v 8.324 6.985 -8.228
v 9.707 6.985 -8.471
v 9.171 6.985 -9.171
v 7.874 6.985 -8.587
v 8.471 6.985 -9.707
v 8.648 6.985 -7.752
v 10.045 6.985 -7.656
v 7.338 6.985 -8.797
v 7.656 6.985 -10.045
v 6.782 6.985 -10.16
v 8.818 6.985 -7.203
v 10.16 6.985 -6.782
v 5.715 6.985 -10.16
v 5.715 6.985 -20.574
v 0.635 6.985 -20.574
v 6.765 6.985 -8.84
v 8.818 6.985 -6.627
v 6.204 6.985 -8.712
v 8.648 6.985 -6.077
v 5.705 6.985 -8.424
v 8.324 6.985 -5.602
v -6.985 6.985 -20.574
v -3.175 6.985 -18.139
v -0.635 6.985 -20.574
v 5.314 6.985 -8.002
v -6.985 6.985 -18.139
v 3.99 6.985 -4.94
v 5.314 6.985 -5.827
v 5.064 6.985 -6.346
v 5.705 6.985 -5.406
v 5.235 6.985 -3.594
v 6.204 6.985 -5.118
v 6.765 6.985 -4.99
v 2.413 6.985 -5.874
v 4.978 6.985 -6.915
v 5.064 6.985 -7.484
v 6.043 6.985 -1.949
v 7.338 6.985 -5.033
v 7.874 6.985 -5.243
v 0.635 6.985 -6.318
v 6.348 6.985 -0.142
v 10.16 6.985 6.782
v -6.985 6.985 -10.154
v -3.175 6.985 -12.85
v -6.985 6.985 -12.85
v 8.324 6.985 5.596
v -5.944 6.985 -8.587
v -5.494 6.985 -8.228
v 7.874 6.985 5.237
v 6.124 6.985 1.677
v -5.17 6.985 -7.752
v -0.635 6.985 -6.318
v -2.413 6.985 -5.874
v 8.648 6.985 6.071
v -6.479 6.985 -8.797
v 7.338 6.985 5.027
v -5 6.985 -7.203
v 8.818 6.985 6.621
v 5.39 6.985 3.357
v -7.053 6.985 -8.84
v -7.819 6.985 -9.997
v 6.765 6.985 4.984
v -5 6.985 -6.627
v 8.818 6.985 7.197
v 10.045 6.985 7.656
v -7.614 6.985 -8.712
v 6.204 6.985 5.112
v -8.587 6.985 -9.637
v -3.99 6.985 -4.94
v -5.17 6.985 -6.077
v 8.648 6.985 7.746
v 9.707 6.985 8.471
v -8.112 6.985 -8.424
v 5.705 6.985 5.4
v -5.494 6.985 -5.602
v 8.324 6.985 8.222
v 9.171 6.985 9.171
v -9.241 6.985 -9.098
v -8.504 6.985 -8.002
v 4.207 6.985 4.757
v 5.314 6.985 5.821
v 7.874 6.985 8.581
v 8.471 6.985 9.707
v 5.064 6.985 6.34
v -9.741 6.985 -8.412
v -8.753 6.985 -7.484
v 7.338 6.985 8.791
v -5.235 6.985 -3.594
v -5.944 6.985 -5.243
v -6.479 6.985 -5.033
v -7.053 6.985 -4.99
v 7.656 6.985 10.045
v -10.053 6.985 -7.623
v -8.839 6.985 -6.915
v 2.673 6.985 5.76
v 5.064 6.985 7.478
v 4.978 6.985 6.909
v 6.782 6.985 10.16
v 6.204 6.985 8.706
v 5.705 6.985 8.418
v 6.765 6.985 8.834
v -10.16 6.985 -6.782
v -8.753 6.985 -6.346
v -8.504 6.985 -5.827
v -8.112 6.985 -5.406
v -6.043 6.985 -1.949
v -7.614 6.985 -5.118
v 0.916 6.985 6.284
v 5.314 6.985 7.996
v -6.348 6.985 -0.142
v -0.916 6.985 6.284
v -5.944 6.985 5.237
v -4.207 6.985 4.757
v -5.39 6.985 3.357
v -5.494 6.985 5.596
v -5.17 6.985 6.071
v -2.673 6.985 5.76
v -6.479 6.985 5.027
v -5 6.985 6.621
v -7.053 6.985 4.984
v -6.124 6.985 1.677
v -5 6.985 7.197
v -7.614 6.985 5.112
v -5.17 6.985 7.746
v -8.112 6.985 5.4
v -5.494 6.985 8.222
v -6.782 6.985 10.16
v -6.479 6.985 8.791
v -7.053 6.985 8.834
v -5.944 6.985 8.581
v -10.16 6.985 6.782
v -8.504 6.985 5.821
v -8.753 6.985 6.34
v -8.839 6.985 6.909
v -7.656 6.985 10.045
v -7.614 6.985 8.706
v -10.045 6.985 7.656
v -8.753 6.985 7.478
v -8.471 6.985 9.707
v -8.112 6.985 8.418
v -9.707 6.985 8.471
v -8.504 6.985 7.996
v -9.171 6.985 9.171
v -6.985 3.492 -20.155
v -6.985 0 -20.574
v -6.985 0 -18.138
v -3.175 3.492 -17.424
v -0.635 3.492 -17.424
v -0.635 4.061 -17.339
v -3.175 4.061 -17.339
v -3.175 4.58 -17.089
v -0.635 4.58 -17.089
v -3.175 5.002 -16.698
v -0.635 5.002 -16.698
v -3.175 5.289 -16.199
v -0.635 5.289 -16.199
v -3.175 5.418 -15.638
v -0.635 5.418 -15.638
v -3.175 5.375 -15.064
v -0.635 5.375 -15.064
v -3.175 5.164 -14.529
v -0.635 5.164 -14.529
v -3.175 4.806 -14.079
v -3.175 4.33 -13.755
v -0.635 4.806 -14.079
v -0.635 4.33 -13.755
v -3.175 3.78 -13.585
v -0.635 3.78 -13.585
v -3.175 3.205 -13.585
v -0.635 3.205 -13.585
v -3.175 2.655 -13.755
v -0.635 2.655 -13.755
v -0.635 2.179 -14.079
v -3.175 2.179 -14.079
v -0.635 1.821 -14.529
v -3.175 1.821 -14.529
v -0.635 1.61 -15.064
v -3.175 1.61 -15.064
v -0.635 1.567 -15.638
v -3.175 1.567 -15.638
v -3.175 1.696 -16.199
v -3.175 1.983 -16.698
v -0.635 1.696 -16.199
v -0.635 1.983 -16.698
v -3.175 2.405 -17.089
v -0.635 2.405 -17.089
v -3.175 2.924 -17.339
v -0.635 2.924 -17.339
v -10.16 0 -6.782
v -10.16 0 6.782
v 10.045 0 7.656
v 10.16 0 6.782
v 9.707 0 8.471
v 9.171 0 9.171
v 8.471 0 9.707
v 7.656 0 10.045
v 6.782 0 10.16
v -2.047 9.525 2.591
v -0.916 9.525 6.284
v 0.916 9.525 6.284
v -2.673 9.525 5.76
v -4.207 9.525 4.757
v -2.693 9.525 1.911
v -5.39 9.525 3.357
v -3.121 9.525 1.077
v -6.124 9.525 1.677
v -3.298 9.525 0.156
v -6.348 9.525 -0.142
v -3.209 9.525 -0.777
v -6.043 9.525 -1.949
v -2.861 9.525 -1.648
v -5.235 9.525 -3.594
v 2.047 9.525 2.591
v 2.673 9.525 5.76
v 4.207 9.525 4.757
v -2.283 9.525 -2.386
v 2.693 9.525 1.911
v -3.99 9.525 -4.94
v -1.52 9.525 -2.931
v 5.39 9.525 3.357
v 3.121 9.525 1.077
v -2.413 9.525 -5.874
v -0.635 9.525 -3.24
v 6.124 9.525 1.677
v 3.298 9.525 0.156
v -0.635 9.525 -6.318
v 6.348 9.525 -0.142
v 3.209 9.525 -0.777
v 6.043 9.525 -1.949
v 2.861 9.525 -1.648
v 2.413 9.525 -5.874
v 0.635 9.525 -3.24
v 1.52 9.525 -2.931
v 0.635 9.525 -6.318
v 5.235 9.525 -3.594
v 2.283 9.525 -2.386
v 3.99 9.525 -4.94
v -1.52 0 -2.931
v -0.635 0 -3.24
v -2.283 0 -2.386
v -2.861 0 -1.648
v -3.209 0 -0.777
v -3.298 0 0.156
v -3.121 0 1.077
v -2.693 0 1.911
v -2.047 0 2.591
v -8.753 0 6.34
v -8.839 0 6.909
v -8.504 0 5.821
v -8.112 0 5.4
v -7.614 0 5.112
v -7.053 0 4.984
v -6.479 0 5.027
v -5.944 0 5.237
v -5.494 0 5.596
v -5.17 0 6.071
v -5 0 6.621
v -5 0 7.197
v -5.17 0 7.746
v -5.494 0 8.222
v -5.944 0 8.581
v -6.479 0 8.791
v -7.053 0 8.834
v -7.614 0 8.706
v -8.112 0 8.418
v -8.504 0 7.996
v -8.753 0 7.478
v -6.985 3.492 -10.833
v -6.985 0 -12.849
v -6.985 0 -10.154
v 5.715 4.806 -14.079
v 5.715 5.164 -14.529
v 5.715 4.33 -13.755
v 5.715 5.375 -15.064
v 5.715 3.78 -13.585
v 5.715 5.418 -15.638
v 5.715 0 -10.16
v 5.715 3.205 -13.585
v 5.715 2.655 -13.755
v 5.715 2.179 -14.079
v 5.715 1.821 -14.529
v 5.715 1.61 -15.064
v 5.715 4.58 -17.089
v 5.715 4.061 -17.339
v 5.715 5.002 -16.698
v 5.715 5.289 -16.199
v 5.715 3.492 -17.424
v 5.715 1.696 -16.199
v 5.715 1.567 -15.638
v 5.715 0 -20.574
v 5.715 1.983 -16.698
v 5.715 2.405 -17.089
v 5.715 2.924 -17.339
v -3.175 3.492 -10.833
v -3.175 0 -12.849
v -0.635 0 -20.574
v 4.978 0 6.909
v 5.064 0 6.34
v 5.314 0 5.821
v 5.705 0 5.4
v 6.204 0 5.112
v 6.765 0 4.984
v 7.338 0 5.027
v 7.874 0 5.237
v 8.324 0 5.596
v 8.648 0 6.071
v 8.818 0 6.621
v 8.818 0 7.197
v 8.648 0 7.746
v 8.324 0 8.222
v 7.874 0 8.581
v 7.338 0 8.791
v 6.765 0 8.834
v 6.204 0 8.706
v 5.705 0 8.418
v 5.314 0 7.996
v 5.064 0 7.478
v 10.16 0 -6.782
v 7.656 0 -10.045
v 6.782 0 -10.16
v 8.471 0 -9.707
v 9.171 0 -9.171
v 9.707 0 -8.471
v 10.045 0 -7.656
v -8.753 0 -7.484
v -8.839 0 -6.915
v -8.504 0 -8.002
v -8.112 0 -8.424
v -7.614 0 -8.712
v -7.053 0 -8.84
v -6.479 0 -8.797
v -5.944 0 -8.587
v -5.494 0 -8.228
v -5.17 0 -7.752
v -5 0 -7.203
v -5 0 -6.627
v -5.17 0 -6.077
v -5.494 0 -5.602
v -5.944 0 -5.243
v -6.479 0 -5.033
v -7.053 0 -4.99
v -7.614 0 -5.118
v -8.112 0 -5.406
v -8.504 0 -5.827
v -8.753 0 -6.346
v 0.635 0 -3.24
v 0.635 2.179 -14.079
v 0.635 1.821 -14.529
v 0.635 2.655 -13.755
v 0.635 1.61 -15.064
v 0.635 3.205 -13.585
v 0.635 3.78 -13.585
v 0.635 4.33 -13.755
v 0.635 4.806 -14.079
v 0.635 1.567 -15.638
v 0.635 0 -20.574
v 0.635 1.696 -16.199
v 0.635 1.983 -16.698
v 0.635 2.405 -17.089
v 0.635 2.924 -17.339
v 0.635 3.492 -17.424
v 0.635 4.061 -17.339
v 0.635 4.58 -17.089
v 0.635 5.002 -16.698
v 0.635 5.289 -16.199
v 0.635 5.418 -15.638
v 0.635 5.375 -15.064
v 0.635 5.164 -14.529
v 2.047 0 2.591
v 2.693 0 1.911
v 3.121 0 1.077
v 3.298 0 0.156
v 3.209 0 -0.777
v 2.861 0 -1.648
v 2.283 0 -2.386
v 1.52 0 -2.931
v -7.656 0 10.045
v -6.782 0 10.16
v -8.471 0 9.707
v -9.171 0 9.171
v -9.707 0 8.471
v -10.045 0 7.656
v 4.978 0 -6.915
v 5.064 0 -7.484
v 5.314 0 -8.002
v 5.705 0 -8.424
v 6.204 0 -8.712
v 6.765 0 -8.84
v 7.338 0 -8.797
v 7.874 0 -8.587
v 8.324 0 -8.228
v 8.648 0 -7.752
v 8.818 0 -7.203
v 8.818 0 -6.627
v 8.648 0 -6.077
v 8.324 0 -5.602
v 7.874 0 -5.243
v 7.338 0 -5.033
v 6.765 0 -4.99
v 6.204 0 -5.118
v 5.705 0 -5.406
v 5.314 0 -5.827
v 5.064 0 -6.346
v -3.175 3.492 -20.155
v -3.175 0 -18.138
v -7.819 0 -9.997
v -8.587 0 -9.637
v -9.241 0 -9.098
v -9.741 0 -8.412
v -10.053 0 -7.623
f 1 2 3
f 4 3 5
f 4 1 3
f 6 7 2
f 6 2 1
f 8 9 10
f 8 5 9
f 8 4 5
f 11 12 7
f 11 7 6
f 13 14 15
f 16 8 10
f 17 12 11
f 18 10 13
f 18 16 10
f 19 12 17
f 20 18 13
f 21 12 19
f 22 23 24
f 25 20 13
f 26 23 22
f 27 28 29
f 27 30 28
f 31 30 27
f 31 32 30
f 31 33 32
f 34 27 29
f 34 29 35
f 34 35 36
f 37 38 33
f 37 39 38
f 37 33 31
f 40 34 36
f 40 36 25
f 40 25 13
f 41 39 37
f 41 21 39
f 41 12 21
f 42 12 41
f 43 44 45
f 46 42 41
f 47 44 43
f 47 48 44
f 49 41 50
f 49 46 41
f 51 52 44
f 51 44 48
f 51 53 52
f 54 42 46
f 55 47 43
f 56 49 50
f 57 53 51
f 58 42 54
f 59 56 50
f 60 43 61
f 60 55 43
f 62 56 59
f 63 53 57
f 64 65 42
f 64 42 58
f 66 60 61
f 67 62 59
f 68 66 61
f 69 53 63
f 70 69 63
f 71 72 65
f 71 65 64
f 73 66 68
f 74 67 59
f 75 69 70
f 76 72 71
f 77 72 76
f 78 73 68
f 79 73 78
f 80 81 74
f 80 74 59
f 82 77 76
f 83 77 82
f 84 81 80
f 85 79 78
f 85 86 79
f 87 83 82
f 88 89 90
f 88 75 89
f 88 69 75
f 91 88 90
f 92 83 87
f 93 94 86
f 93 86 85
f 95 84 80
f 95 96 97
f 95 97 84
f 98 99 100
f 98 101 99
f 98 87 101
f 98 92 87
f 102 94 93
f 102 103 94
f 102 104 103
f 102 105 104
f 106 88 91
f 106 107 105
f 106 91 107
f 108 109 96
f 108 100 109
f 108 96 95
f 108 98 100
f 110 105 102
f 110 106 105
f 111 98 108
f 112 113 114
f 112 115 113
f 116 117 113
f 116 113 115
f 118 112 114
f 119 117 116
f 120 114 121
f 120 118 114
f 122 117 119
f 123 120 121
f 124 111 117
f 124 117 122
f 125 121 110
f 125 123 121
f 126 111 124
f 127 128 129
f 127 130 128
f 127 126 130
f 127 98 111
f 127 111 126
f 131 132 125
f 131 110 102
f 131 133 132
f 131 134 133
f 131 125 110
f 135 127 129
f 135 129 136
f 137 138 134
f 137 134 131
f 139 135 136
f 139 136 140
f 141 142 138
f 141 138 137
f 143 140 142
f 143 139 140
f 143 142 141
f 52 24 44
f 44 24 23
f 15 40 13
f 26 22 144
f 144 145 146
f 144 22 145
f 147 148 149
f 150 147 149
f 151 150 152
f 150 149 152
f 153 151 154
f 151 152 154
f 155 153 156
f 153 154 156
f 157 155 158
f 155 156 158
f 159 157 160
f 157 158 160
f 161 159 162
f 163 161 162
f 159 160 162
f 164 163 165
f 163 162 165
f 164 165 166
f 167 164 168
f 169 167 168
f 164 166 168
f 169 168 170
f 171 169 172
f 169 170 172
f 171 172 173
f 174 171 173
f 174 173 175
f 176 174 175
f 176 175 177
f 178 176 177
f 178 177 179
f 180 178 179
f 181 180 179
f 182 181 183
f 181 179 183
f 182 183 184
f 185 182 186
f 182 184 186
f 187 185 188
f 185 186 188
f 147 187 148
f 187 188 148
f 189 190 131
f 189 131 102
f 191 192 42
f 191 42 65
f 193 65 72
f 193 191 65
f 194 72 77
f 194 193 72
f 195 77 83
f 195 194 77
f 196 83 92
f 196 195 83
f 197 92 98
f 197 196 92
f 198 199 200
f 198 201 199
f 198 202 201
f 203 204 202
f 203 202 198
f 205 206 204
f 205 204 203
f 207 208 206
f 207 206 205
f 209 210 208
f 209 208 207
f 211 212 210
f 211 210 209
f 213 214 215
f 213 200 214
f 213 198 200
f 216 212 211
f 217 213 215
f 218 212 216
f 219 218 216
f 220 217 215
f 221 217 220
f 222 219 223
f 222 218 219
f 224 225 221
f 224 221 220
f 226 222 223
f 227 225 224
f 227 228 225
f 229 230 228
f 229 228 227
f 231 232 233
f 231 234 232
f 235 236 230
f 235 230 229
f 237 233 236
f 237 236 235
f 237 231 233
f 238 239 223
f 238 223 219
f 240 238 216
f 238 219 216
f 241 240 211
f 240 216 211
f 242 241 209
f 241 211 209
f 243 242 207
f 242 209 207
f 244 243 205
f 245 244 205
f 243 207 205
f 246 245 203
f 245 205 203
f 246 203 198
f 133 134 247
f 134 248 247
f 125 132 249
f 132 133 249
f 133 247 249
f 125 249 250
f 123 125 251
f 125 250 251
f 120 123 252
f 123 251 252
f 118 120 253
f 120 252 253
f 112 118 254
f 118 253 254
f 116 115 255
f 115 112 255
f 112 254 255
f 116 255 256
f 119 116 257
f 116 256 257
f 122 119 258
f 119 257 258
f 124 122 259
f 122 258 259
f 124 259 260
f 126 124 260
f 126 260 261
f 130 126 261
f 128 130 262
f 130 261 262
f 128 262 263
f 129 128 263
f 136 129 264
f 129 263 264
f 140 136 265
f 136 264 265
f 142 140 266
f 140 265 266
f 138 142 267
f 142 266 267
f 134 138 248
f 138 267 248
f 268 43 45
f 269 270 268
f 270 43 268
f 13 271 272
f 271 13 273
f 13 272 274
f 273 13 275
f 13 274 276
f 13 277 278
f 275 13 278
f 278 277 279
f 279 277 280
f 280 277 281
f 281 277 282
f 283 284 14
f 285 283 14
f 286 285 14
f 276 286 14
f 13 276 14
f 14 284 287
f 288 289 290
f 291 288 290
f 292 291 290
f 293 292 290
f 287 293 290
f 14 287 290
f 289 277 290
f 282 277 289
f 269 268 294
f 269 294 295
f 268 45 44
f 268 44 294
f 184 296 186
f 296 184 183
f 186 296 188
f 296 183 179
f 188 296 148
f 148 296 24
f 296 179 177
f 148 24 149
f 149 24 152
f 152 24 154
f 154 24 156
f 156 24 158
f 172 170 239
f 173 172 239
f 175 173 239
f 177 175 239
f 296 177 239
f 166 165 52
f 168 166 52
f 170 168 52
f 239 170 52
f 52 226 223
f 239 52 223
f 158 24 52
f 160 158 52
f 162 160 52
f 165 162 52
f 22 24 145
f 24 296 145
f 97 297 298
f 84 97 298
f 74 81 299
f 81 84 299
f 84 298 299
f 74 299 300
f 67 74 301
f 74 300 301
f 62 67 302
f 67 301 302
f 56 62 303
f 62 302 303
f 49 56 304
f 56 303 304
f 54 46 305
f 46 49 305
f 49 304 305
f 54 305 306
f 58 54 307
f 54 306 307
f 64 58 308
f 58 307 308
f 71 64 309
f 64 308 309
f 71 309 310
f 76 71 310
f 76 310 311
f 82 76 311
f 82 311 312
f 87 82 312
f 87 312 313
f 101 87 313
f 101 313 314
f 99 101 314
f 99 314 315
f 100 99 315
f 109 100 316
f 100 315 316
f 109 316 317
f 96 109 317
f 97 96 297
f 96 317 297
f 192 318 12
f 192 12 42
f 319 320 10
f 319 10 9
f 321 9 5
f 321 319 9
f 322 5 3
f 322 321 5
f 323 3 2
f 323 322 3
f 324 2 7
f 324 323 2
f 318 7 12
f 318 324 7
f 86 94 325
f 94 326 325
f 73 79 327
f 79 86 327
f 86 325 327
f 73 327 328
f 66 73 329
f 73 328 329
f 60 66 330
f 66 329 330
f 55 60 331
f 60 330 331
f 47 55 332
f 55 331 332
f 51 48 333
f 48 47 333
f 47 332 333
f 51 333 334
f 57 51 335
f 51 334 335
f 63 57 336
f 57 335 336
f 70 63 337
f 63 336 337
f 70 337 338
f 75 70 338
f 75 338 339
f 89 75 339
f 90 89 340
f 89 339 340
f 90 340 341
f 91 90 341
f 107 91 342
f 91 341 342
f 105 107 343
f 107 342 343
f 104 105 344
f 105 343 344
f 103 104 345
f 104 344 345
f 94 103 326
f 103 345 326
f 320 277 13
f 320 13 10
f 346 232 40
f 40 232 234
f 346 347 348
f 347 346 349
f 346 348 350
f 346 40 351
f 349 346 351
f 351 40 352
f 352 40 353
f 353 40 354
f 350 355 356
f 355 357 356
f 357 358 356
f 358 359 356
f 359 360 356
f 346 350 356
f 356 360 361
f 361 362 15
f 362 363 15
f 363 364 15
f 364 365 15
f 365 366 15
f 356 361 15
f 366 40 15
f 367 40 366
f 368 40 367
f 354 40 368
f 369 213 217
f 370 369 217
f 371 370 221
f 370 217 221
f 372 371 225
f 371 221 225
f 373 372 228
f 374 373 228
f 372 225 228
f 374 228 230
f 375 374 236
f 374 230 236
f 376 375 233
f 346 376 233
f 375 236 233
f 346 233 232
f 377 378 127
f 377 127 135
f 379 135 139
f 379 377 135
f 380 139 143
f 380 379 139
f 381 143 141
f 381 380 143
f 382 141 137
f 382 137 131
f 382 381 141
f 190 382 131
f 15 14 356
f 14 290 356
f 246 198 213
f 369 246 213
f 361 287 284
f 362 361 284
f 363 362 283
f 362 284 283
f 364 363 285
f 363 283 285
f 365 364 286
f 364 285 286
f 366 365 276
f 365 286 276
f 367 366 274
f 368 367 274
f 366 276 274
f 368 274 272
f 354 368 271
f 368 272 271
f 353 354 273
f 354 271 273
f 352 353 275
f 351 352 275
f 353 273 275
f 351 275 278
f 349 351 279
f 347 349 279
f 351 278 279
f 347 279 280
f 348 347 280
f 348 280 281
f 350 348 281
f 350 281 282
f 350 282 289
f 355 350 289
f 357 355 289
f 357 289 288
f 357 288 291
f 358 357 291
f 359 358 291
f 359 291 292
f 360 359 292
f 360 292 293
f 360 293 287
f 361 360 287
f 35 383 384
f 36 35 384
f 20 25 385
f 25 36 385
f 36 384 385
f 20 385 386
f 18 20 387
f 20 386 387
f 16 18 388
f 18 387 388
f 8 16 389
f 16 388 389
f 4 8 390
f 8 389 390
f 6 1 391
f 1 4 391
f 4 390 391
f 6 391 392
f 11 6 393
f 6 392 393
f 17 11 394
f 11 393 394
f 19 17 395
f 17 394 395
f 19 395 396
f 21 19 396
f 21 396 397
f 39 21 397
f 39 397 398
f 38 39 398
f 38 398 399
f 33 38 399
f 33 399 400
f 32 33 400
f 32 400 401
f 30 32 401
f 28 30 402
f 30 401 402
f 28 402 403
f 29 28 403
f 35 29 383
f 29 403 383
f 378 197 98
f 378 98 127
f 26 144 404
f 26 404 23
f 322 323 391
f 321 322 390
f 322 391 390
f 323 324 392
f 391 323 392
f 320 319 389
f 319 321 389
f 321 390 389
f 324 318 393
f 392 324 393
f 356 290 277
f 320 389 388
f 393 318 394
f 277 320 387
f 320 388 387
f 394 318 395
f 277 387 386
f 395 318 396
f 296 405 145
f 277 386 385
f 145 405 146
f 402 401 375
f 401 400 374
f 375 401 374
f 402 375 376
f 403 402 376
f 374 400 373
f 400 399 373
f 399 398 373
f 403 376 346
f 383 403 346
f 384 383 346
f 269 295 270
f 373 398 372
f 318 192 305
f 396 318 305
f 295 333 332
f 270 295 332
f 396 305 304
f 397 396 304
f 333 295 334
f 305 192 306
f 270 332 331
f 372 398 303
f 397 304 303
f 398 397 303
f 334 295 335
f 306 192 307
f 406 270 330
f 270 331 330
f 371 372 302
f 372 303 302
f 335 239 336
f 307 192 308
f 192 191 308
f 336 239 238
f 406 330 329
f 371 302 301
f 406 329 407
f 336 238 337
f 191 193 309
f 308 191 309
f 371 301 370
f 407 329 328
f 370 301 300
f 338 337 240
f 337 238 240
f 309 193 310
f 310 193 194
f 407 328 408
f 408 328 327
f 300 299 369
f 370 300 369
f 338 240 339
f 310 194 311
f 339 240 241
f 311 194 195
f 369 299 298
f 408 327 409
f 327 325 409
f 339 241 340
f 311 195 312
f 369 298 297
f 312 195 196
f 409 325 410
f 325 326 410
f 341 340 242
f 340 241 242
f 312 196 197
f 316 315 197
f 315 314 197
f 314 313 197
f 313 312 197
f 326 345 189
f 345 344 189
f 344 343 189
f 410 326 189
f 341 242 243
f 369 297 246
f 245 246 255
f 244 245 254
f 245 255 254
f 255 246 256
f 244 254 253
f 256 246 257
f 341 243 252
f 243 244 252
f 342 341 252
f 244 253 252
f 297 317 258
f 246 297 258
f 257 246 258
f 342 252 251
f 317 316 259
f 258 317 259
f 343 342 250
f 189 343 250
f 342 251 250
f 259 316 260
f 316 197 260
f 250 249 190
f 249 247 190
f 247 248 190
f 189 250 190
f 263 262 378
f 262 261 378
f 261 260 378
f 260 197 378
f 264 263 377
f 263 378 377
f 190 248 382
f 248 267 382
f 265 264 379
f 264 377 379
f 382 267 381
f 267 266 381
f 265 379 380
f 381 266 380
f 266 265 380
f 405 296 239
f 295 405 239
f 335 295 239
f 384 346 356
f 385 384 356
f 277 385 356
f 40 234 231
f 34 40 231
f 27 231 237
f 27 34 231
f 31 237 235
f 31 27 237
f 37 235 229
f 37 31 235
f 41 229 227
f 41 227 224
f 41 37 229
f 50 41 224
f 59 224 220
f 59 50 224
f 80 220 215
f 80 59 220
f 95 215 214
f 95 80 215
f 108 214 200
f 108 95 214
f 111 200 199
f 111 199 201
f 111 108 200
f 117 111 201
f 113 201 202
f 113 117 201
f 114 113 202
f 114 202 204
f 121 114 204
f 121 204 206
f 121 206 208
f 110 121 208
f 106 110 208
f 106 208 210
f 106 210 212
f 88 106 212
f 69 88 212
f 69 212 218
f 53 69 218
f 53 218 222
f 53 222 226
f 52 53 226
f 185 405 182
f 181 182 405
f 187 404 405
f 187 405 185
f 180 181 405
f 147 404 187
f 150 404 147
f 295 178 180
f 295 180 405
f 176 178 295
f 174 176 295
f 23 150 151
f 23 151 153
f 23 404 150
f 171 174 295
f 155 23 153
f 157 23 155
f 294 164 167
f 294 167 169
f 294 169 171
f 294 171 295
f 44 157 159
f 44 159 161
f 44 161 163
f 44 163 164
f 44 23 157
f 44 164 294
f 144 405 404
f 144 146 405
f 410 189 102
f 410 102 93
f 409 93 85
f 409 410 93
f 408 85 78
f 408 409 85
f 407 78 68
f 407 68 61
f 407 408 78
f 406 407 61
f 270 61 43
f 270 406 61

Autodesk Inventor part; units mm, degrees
ref_plane "YZ Plane" through (0, 0, 0) normal (1, 0, 0) x (0, 1, 0)
ref_plane "XZ Plane" through (0, 0, 0) normal (0, 1, 0) x (-1, 0, 0)
ref_plane "XY Plane" through (0, 0, 0) normal (0, 0, 1) x (1, 0, 0)
sketch "Sketch1" plane through (0, 0, 0) normal (0, 1, 0) x (-1, 0, 0)
  line L0 (-10.16, 10.16) -> (10.16, 10.16)
  line L1 (10.16, 10.16) -> (10.16, -10.16)
  line L2 (-10.16, -10.16) -> (-10.16, 10.16)
  circle A0 centre (6.9088, -6.9148) radius 1.9304
  circle A1 centre (6.9088, 6.9088) radius 1.9304
  circle A2 centre (-6.9088, 6.9088) radius 1.9304
  circle A3 centre (-6.9088, -6.9148) radius 1.9304
  line L3 (-5.715, -10.16) -> (-5.715, -20.574)
  line L4 (-5.715, -20.574) -> (6.985, -20.574)
  line L5 (6.985, -20.574) -> (6.985, -10.16)
  line L6 (10.16, -10.16) -> (6.985, -10.16)
  line L7 (-5.715, -10.16) -> (-10.16, -10.16)
  point P0 (0, 0)
  dimension "d0" = 20.32
  dimension "d2" = 10.16
  dimension "d3" = 10.16
  dimension "d4" = 3.8608
  dimension "d5" = 6.9148
  dimension "d6" = 6.9088
  dimension "d7" = 3.8608
  dimension "d8" = 6.9088
  dimension "d9" = 6.9088
  dimension "d10" = 3.8608
  dimension "d11" = 6.9088
  dimension "d12" = 6.9088
  dimension "d13" = 3.8608
  dimension "d14" = 12.7
  dimension "d16" = 6.985
extrude "Extrusion1" add sketch "Sketch1" along normal blind 6.985
sketch "Sketch2" plane through (-6.985, 0, -20.574) normal (-1, 0, 0) x (0, 0, 1)
  circle A0 centre (5.08, 3.4925) radius 4.6609 construction
  line L0 (10.414, 0) -> (0, 0) projected
  line L1 (0, 0) -> (0, 6.985) projected
  line L2 (9.7409, 3.4925) -> (7.4105, -0.544)
  line L3 (7.4105, -0.544) -> (2.7496, -0.544)
  line L4 (2.7496, -0.544) -> (0.4191, 3.4925)
  line L5 (0.4191, 3.4925) -> (2.7495, 7.529)
  line L6 (2.7495, 7.529) -> (7.4104, 7.529)
  line L7 (7.4104, 7.529) -> (9.7409, 3.4925)
  point P0 (20.574, 0)
  dimension "d19" = 9.3218
  dimension "d20" = 3.4925
  dimension "d21" = 5.08
extrude "Extrusion2" cut sketch "Sketch2" against normal blind 3.81
sketch "Sketch3" plane through (5.715, 0, -10.16) normal (1, 0, 0) x (0, 0, -1)
  circle A0 centre (5.334, 3.4925) radius 1.9304
  line L0 (10.414, 0) -> (10.414, 6.985) projected
  line L1 (0, 6.985) -> (10.414, 6.985) projected
  point P0 (-10.16, 0)
  dimension "d24" = 3.8608
  dimension "d25" = 5.08
  dimension "d26" = 3.4925
extrude "Extrusion3" cut sketch "Sketch3" against normal through all
sketch "Sketch4" plane through (0, 6.985, 0) normal (0, 1, 0) x (1, 0, 0)
  circle A0 centre (0, 0) radius 6.35
  dimension "d29" = 12.7
extrude "Extrusion4" add sketch "Sketch4" along normal blind 2.54
sketch "Sketch5" plane through (0, 9.525, 0) normal (0, 1, 0) x (1, 0, 0)
  arc A0 (2.0472, -2.5908) -> (-2.0472, -2.5908) centre (0, 0) ccw
  line L0 (-2.0472, -2.5908) -> (2.0472, -2.5908)
  dimension "d32" = 6.604
  dimension "d33" = 2.5908
fillet "Fillet1" radius 3.3782 4 edges at (10.16, 3.4925, 10.16) (10.16, 3.4925, -10.16) (-10.16, 3.4925, 10.16) (-10.16, 3.4925, -10.16)
extrude "Extrusion5" cut sketch "Sketch5" against normal through all
sketch "Sketch6" plane through (0, 9.525, 0) normal (0, 1, 0) x (1, 0, 0)
  line L0 (-6.985, 20.574) -> (5.715, 20.574) projected
  line L1 (0.635, 0) -> (0.635, 20.574)
  line L2 (0.635, 20.574) -> (-0.635, 20.574)
  line L3 (-0.635, 20.574) -> (-0.635, 0)
  line L4 (-0.635, -20.574) -> (0.635, 20.574) construction
  line L5 (0.635, -20.574) -> (-0.635, 20.574) construction
  line L6 (-0.635, 0) -> (0.635, 0)
  point P0 (0, 0)
  dimension "d37" = 1.27
extrude "Extrusion6" cut sketch "Sketch6" against normal through all
sketch "Sketch7" plane through (0, 0, 0) normal (0, -1, 0) x (1, 0, 0)
  circle A0 centre (-6.9088, 6.9088) radius 1.9304 construction
  circle A1 centre (-6.9088, 6.9088) radius 4.6609 construction
  point P0 (0, 0)
  dimension "d40" = 9.3218
properties part number "clamping hub 1_4 D b"
